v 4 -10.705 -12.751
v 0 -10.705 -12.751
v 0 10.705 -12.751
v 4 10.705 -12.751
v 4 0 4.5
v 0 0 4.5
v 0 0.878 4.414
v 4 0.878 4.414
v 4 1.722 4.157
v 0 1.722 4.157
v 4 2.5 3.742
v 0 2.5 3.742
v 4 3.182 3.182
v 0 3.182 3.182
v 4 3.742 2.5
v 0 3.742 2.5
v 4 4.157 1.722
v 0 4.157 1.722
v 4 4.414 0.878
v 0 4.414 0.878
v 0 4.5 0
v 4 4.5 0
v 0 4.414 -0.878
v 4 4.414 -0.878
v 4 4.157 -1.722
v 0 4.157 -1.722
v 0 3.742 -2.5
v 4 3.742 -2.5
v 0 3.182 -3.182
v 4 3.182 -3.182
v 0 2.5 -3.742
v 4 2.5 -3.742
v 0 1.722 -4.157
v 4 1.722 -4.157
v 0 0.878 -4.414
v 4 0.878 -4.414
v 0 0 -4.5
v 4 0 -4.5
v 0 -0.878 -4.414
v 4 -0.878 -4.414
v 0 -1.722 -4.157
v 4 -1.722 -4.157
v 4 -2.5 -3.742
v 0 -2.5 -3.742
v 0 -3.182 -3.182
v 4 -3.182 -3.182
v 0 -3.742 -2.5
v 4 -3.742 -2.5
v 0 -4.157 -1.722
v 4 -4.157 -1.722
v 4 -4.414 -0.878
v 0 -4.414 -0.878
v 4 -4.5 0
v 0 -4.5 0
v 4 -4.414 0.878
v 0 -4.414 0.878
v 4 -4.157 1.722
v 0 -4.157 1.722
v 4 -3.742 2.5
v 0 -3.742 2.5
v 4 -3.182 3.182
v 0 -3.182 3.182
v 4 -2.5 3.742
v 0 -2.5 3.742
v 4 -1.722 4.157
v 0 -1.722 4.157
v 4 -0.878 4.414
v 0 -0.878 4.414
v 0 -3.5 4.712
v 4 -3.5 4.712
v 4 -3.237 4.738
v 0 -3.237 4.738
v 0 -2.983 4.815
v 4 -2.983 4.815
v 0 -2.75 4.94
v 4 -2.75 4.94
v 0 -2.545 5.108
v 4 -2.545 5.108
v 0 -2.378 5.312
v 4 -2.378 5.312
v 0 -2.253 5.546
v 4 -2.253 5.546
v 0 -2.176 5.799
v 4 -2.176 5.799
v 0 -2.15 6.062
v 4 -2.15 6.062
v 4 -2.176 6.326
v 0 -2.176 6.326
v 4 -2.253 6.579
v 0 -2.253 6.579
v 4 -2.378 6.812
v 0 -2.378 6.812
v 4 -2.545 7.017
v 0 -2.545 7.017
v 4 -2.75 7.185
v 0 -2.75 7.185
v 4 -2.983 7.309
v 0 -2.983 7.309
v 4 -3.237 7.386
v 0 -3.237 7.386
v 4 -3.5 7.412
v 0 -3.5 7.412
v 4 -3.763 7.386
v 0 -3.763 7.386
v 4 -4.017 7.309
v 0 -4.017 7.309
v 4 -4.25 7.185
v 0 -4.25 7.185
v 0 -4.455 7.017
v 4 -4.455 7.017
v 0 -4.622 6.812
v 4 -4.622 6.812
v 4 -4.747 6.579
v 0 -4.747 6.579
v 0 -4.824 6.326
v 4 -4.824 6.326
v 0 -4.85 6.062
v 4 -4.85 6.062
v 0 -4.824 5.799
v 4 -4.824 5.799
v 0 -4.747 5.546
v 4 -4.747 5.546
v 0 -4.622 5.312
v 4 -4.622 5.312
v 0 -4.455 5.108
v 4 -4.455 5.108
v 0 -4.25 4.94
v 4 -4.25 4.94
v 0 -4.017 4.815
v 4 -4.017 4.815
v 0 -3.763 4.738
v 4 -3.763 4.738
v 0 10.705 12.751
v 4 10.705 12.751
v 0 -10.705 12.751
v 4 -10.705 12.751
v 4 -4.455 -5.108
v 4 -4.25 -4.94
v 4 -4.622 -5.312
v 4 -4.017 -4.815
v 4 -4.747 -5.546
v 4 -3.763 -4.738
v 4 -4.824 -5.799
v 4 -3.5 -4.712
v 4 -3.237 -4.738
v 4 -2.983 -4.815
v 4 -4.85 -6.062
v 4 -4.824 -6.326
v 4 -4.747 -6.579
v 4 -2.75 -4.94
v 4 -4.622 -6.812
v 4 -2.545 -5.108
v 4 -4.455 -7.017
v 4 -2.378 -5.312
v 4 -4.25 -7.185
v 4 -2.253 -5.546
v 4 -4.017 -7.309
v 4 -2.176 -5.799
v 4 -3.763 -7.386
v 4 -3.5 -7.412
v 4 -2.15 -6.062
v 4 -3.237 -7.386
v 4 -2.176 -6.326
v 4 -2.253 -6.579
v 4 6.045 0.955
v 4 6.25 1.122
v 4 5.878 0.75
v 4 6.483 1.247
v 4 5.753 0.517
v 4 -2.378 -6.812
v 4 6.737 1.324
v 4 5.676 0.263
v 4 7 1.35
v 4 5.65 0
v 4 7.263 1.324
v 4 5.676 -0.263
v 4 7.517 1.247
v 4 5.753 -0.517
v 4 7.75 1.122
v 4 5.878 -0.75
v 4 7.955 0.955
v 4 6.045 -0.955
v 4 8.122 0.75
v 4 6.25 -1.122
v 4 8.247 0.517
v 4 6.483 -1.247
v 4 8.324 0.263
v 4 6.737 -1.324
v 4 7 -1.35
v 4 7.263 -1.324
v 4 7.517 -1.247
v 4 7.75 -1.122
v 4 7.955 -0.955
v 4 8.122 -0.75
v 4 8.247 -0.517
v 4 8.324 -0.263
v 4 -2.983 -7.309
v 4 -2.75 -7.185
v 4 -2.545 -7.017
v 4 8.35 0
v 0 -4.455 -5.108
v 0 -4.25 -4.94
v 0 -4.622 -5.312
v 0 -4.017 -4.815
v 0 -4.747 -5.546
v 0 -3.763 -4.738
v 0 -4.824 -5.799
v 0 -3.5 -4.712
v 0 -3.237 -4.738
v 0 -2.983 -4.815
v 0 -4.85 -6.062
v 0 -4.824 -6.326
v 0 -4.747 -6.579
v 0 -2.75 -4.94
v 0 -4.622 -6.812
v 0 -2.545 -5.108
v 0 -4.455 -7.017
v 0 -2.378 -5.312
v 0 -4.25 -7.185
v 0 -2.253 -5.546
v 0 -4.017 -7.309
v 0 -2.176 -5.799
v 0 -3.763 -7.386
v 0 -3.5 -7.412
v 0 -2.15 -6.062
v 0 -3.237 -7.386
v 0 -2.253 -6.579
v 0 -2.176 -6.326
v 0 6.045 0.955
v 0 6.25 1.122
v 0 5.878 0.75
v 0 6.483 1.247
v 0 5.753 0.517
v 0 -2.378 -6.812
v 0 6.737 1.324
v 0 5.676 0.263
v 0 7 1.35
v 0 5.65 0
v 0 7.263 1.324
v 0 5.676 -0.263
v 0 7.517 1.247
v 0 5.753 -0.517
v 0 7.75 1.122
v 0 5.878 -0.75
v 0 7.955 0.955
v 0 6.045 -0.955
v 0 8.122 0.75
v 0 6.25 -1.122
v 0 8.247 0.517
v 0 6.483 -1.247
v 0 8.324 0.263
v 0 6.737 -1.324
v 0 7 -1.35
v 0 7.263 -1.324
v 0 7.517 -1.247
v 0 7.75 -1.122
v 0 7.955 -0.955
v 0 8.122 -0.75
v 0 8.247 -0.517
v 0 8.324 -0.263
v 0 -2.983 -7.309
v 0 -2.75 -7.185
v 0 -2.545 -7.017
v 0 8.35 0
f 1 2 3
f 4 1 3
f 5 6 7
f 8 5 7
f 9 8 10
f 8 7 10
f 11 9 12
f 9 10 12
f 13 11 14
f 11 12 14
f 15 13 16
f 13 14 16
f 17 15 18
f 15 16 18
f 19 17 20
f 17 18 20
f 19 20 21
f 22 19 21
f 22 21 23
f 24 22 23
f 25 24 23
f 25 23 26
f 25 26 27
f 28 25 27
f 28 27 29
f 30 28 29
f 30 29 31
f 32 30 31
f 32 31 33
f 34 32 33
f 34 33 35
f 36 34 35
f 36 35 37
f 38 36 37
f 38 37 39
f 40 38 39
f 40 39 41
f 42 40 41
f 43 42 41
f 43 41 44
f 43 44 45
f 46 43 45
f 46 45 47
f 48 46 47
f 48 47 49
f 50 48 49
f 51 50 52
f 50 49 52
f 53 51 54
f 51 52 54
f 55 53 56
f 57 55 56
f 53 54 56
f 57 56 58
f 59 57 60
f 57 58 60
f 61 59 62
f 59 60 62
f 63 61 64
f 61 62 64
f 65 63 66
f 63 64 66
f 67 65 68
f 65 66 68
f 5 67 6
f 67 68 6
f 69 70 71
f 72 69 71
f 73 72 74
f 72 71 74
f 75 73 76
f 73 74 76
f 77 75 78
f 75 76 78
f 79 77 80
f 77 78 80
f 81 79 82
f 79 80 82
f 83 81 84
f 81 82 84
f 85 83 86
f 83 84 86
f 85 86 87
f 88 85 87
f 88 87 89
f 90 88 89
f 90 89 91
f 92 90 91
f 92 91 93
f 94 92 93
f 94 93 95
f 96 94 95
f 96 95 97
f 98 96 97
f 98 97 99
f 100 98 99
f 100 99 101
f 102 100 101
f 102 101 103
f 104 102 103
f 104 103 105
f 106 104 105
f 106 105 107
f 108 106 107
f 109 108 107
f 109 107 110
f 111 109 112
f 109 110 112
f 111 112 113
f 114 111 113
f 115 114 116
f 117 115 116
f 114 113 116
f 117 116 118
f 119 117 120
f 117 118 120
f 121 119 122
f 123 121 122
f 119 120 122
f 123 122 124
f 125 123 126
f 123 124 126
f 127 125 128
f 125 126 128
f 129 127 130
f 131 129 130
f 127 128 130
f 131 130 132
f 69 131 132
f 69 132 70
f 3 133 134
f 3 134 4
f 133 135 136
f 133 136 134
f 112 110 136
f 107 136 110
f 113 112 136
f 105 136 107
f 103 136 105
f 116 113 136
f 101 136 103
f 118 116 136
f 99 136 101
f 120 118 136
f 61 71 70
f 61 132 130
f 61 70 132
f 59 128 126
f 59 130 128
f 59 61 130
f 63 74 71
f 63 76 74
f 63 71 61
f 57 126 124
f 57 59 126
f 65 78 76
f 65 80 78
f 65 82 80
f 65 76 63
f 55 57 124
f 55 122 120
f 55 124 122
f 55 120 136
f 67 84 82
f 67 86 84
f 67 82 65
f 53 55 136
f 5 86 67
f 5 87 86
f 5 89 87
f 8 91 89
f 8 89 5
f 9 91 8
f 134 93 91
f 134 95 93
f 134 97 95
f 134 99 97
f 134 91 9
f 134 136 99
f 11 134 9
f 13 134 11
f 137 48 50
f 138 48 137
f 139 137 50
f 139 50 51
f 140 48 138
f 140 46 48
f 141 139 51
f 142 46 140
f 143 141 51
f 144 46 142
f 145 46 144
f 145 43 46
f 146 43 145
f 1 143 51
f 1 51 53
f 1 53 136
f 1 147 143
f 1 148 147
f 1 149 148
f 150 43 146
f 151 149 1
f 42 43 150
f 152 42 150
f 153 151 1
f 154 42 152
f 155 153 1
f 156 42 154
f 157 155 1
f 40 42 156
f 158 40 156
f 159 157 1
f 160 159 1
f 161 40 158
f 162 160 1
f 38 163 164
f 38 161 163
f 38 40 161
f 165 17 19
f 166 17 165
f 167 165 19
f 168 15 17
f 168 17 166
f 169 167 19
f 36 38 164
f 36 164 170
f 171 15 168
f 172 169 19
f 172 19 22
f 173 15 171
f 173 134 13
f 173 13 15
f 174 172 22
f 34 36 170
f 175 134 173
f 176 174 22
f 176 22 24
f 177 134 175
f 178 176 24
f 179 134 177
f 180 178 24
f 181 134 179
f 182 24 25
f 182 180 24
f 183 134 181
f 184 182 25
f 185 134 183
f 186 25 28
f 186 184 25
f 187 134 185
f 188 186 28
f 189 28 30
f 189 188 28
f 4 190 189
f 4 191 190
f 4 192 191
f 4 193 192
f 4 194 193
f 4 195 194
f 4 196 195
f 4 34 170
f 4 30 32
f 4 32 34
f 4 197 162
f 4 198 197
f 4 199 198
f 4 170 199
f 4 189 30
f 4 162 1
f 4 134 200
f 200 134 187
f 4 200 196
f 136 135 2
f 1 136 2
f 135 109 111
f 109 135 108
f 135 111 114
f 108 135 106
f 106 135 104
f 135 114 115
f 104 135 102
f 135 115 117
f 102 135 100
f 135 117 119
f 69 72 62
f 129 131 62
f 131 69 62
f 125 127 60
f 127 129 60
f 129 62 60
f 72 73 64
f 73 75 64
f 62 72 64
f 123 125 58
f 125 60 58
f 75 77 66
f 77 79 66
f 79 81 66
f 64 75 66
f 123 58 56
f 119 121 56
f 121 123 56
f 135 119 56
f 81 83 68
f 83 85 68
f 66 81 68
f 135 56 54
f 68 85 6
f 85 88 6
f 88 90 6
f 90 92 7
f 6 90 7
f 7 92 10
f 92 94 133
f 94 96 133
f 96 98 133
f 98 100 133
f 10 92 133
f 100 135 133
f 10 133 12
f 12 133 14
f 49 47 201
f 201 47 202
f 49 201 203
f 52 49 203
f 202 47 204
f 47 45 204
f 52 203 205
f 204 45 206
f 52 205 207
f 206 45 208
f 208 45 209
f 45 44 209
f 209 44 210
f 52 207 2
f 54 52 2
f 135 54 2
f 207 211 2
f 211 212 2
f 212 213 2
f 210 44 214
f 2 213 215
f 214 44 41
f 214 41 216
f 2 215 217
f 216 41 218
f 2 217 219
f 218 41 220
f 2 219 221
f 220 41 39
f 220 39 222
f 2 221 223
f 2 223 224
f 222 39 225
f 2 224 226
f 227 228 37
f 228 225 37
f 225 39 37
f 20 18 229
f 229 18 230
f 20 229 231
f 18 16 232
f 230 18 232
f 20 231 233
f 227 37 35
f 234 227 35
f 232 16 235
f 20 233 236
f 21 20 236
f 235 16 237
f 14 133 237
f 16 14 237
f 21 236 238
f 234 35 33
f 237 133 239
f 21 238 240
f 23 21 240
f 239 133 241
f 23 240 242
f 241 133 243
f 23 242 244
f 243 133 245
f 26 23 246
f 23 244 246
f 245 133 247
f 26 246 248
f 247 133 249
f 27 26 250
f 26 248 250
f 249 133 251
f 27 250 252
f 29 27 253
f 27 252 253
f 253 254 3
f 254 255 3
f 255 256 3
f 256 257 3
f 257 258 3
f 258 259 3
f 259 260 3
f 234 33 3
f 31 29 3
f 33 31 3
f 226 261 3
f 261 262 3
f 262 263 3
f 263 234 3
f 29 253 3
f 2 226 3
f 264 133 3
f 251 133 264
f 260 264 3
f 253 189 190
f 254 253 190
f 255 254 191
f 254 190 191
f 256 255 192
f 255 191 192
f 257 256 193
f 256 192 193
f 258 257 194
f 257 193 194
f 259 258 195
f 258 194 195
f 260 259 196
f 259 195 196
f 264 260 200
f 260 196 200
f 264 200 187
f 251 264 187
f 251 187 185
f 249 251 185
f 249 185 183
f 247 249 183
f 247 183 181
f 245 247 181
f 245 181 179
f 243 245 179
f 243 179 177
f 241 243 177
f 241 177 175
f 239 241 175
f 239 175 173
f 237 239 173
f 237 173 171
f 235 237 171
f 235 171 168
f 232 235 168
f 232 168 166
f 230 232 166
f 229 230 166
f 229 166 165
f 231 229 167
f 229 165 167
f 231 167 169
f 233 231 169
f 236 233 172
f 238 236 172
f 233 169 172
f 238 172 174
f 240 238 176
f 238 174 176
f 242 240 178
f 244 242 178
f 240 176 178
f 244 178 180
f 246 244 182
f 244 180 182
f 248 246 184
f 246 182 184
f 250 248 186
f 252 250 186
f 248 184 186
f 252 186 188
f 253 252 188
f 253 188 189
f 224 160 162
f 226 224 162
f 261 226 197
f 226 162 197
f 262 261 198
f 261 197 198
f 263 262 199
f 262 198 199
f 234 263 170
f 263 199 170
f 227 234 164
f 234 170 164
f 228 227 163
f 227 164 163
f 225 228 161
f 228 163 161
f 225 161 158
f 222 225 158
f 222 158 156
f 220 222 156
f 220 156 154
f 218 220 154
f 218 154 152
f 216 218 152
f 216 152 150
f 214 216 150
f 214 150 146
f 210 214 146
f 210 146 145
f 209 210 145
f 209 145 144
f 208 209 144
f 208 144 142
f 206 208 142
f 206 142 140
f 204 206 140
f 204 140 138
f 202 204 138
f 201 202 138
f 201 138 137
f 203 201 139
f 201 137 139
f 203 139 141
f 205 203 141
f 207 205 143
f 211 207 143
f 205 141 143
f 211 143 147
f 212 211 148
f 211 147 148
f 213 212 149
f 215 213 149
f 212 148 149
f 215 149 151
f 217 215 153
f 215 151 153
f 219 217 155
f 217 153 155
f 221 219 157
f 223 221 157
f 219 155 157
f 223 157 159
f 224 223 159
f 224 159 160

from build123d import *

# Parameters (mm, degrees)
SKETCH2_W                  = 25.50248159
SKETCH2_H                  = 21.40954602
BOSS_EXTRUDE1_DEPTH        = 4
M2_5_CLEARANCE_HOLE1_D     = 2.7
M2_5_CLEARANCE_HOLE1_DEPTH = 6.65
M2_5_CLEARANCE_HOLE1_TIP   = 0.811161836
SKETCH6_R                  = 4.5
CUT_EXTRUDE1_DEPTH         = 18.12268399


with BuildPart() as part:
    # Sketch2 → Boss-Extrude1 (new body)
    with BuildSketch(Plane(origin=(0, 0, 0), x_dir=(0, 0, -1), z_dir=(1, 0, 0))):
        Rectangle(SKETCH2_W, SKETCH2_H)
    extrude(amount=BOSS_EXTRUDE1_DEPTH)

    # M2.5 Clearance Hole1
    with Locations(Plane.ZY):
        with Locations((0, 7), (-6.062177826, -3.5), (6.062177826, -3.5)):
            Hole(M2_5_CLEARANCE_HOLE1_D / 2, depth=M2_5_CLEARANCE_HOLE1_DEPTH)
            with Locations((0, 0, -(M2_5_CLEARANCE_HOLE1_DEPTH + M2_5_CLEARANCE_HOLE1_TIP / 2))):  # 118° drill point
                Cone(0, M2_5_CLEARANCE_HOLE1_D / 2, M2_5_CLEARANCE_HOLE1_TIP, mode=Mode.SUBTRACT)

    # Sketch6 → Cut-Extrude1 (cut, through all)
    with BuildSketch(Plane.ZY):
        Circle(SKETCH6_R)
    extrude(amount=-CUT_EXTRUDE1_DEPTH, mode=Mode.SUBTRACT)


solid = part.part
